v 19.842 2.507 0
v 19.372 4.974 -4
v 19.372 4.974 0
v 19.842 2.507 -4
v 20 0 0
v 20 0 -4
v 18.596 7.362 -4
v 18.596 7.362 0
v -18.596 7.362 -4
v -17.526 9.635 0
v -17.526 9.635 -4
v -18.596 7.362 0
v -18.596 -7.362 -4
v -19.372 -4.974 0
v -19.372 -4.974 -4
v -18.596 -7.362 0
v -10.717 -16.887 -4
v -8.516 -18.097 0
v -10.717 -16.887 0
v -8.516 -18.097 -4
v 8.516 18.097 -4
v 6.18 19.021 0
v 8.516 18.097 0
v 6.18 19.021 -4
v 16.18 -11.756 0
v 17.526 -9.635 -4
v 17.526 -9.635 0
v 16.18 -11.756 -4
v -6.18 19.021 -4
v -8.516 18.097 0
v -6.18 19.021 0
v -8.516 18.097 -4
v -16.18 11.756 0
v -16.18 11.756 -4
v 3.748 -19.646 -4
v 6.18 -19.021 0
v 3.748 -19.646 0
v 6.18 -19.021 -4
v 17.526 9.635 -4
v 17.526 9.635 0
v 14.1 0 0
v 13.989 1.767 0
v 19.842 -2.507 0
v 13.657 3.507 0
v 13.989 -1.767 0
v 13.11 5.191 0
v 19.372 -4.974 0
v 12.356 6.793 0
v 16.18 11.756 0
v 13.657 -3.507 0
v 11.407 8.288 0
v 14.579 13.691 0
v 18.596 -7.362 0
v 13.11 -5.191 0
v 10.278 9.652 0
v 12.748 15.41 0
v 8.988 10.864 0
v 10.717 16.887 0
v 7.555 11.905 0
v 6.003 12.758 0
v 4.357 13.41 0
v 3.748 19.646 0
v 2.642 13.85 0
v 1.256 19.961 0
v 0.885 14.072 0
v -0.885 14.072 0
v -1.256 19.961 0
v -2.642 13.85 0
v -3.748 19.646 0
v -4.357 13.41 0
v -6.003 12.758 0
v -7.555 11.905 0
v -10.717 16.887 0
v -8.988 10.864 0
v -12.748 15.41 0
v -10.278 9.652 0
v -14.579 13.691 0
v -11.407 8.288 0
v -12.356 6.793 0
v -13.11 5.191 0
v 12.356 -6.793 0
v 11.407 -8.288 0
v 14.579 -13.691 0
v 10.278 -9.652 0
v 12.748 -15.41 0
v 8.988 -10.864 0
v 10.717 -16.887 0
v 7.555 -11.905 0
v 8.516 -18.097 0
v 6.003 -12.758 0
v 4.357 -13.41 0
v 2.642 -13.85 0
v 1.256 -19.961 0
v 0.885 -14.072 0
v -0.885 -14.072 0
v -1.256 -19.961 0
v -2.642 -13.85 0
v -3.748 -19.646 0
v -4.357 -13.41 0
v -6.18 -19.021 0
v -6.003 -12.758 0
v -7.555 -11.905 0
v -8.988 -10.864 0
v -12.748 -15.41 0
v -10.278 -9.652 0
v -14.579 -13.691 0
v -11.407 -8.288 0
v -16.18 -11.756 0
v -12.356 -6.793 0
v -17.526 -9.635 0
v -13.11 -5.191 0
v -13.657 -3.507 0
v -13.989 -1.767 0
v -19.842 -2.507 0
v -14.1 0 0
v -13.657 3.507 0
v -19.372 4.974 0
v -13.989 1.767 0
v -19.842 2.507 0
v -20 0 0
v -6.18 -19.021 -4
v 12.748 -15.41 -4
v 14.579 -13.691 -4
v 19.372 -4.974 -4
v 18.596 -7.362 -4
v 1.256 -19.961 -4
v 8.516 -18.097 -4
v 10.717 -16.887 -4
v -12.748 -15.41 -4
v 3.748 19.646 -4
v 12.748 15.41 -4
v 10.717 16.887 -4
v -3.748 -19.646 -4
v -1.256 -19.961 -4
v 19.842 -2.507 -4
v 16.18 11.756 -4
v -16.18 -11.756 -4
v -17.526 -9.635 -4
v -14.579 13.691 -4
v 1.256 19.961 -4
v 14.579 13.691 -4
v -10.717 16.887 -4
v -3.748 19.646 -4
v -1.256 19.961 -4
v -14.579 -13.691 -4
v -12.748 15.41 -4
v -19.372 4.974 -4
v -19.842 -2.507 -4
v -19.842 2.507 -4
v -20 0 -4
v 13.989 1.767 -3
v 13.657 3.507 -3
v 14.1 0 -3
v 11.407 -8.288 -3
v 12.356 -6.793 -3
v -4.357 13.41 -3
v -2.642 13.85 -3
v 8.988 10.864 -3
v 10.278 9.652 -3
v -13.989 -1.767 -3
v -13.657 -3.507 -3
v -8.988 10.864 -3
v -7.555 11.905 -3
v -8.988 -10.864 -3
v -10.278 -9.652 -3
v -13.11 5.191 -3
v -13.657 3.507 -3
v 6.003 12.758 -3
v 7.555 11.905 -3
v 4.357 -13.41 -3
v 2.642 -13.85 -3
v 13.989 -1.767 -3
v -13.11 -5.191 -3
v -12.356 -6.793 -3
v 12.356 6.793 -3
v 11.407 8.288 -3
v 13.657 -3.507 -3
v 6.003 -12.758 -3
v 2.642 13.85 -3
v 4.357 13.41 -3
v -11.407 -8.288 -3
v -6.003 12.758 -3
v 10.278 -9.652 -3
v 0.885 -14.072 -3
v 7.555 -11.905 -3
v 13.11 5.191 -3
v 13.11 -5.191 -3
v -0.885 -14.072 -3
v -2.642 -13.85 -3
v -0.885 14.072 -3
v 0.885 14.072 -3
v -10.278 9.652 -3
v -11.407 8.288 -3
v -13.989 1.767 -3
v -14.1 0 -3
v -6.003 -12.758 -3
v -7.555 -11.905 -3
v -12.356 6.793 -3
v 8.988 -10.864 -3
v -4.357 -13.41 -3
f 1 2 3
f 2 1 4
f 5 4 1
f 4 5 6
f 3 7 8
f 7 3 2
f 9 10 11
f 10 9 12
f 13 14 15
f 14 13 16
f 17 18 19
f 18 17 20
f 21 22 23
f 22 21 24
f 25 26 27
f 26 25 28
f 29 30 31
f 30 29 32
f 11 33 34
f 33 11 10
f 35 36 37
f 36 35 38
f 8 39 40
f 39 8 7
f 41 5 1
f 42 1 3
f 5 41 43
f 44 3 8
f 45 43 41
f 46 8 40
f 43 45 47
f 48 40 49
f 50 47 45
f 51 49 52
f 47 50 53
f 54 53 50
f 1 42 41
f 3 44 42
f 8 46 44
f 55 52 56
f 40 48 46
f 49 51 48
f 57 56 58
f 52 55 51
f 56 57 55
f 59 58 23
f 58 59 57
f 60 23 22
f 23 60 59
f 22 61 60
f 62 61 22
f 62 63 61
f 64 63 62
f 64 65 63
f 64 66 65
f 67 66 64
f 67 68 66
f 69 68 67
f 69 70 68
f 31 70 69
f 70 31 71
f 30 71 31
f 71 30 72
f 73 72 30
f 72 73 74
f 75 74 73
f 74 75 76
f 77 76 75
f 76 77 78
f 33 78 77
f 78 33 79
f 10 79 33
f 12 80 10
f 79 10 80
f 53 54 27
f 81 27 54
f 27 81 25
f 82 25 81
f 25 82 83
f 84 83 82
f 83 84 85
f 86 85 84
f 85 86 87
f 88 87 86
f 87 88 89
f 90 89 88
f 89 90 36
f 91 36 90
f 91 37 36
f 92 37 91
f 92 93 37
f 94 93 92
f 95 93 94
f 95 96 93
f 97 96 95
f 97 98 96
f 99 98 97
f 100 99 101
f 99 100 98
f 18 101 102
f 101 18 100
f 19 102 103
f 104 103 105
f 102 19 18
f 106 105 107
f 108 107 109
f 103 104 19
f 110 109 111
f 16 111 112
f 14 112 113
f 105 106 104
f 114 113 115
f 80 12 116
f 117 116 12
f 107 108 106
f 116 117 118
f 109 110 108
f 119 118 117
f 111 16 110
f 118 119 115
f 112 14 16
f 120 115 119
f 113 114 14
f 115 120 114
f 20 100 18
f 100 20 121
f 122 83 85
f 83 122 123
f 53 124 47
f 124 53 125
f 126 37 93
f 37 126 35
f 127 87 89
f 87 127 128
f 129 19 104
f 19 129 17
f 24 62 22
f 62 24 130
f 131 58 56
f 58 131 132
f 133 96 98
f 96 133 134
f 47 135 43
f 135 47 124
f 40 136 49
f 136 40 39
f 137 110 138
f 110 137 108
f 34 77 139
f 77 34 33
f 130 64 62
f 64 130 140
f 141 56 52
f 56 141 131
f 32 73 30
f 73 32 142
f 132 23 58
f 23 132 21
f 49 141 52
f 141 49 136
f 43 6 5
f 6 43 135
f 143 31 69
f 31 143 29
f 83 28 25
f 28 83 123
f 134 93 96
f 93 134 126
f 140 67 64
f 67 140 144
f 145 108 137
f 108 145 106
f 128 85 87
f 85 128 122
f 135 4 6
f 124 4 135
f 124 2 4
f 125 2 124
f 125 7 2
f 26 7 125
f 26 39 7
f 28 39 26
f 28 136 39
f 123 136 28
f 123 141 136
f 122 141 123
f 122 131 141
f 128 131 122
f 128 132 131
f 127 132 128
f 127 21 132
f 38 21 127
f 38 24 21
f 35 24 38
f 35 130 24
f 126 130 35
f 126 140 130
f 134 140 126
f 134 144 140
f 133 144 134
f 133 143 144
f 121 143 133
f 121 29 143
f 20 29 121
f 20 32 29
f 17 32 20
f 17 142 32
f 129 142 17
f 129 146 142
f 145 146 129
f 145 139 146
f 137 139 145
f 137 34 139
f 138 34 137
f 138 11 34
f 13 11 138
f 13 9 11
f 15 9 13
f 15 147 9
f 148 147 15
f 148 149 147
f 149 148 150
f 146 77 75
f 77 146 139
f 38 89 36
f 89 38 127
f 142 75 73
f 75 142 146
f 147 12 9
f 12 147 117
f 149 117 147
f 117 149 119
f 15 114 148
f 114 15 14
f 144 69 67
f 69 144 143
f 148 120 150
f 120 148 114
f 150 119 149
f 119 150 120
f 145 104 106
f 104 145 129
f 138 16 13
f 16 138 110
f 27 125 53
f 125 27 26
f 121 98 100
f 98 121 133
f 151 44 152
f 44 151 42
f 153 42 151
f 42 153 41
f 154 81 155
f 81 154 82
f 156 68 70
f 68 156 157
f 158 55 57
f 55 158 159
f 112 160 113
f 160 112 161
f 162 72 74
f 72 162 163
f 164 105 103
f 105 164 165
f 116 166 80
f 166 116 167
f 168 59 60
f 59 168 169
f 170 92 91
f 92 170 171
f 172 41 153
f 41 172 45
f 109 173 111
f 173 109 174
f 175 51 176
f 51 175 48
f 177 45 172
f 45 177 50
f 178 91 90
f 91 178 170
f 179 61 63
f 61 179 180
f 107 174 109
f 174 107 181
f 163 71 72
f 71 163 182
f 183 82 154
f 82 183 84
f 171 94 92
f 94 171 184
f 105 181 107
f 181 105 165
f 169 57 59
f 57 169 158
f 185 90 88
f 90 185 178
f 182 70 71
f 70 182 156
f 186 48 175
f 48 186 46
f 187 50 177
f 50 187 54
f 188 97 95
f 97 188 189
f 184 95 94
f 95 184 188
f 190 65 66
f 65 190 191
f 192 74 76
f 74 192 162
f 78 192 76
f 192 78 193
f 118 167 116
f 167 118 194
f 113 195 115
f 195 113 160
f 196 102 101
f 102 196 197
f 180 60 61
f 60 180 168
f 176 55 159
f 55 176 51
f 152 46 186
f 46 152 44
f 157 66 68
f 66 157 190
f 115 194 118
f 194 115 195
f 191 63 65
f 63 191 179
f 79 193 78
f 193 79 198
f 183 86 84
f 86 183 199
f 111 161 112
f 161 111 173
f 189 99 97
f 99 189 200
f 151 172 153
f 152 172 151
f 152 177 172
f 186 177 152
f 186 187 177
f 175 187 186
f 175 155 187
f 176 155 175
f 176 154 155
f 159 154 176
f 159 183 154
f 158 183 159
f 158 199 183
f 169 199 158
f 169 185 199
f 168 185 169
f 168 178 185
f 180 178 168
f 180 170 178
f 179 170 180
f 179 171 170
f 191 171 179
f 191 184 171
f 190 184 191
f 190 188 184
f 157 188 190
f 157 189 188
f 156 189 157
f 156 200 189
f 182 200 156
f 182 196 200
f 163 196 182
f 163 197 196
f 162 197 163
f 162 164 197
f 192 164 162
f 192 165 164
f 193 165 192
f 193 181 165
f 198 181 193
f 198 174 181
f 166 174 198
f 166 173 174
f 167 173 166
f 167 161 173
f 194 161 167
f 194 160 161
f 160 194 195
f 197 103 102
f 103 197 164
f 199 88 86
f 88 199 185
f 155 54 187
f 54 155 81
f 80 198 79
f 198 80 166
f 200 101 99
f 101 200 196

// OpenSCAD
$fn = 50;


difference() {
	union() {
		translate(v = [0, 0, -4.0000000000]) {
			cylinder(h = 4, r = 20.0000000000);
		}
	}
	union() {
		#translate(v = [0, 0, -3.0000000000]) {
			cylinder(h = 3, r = 14.1000000000);
		}
	}
}
